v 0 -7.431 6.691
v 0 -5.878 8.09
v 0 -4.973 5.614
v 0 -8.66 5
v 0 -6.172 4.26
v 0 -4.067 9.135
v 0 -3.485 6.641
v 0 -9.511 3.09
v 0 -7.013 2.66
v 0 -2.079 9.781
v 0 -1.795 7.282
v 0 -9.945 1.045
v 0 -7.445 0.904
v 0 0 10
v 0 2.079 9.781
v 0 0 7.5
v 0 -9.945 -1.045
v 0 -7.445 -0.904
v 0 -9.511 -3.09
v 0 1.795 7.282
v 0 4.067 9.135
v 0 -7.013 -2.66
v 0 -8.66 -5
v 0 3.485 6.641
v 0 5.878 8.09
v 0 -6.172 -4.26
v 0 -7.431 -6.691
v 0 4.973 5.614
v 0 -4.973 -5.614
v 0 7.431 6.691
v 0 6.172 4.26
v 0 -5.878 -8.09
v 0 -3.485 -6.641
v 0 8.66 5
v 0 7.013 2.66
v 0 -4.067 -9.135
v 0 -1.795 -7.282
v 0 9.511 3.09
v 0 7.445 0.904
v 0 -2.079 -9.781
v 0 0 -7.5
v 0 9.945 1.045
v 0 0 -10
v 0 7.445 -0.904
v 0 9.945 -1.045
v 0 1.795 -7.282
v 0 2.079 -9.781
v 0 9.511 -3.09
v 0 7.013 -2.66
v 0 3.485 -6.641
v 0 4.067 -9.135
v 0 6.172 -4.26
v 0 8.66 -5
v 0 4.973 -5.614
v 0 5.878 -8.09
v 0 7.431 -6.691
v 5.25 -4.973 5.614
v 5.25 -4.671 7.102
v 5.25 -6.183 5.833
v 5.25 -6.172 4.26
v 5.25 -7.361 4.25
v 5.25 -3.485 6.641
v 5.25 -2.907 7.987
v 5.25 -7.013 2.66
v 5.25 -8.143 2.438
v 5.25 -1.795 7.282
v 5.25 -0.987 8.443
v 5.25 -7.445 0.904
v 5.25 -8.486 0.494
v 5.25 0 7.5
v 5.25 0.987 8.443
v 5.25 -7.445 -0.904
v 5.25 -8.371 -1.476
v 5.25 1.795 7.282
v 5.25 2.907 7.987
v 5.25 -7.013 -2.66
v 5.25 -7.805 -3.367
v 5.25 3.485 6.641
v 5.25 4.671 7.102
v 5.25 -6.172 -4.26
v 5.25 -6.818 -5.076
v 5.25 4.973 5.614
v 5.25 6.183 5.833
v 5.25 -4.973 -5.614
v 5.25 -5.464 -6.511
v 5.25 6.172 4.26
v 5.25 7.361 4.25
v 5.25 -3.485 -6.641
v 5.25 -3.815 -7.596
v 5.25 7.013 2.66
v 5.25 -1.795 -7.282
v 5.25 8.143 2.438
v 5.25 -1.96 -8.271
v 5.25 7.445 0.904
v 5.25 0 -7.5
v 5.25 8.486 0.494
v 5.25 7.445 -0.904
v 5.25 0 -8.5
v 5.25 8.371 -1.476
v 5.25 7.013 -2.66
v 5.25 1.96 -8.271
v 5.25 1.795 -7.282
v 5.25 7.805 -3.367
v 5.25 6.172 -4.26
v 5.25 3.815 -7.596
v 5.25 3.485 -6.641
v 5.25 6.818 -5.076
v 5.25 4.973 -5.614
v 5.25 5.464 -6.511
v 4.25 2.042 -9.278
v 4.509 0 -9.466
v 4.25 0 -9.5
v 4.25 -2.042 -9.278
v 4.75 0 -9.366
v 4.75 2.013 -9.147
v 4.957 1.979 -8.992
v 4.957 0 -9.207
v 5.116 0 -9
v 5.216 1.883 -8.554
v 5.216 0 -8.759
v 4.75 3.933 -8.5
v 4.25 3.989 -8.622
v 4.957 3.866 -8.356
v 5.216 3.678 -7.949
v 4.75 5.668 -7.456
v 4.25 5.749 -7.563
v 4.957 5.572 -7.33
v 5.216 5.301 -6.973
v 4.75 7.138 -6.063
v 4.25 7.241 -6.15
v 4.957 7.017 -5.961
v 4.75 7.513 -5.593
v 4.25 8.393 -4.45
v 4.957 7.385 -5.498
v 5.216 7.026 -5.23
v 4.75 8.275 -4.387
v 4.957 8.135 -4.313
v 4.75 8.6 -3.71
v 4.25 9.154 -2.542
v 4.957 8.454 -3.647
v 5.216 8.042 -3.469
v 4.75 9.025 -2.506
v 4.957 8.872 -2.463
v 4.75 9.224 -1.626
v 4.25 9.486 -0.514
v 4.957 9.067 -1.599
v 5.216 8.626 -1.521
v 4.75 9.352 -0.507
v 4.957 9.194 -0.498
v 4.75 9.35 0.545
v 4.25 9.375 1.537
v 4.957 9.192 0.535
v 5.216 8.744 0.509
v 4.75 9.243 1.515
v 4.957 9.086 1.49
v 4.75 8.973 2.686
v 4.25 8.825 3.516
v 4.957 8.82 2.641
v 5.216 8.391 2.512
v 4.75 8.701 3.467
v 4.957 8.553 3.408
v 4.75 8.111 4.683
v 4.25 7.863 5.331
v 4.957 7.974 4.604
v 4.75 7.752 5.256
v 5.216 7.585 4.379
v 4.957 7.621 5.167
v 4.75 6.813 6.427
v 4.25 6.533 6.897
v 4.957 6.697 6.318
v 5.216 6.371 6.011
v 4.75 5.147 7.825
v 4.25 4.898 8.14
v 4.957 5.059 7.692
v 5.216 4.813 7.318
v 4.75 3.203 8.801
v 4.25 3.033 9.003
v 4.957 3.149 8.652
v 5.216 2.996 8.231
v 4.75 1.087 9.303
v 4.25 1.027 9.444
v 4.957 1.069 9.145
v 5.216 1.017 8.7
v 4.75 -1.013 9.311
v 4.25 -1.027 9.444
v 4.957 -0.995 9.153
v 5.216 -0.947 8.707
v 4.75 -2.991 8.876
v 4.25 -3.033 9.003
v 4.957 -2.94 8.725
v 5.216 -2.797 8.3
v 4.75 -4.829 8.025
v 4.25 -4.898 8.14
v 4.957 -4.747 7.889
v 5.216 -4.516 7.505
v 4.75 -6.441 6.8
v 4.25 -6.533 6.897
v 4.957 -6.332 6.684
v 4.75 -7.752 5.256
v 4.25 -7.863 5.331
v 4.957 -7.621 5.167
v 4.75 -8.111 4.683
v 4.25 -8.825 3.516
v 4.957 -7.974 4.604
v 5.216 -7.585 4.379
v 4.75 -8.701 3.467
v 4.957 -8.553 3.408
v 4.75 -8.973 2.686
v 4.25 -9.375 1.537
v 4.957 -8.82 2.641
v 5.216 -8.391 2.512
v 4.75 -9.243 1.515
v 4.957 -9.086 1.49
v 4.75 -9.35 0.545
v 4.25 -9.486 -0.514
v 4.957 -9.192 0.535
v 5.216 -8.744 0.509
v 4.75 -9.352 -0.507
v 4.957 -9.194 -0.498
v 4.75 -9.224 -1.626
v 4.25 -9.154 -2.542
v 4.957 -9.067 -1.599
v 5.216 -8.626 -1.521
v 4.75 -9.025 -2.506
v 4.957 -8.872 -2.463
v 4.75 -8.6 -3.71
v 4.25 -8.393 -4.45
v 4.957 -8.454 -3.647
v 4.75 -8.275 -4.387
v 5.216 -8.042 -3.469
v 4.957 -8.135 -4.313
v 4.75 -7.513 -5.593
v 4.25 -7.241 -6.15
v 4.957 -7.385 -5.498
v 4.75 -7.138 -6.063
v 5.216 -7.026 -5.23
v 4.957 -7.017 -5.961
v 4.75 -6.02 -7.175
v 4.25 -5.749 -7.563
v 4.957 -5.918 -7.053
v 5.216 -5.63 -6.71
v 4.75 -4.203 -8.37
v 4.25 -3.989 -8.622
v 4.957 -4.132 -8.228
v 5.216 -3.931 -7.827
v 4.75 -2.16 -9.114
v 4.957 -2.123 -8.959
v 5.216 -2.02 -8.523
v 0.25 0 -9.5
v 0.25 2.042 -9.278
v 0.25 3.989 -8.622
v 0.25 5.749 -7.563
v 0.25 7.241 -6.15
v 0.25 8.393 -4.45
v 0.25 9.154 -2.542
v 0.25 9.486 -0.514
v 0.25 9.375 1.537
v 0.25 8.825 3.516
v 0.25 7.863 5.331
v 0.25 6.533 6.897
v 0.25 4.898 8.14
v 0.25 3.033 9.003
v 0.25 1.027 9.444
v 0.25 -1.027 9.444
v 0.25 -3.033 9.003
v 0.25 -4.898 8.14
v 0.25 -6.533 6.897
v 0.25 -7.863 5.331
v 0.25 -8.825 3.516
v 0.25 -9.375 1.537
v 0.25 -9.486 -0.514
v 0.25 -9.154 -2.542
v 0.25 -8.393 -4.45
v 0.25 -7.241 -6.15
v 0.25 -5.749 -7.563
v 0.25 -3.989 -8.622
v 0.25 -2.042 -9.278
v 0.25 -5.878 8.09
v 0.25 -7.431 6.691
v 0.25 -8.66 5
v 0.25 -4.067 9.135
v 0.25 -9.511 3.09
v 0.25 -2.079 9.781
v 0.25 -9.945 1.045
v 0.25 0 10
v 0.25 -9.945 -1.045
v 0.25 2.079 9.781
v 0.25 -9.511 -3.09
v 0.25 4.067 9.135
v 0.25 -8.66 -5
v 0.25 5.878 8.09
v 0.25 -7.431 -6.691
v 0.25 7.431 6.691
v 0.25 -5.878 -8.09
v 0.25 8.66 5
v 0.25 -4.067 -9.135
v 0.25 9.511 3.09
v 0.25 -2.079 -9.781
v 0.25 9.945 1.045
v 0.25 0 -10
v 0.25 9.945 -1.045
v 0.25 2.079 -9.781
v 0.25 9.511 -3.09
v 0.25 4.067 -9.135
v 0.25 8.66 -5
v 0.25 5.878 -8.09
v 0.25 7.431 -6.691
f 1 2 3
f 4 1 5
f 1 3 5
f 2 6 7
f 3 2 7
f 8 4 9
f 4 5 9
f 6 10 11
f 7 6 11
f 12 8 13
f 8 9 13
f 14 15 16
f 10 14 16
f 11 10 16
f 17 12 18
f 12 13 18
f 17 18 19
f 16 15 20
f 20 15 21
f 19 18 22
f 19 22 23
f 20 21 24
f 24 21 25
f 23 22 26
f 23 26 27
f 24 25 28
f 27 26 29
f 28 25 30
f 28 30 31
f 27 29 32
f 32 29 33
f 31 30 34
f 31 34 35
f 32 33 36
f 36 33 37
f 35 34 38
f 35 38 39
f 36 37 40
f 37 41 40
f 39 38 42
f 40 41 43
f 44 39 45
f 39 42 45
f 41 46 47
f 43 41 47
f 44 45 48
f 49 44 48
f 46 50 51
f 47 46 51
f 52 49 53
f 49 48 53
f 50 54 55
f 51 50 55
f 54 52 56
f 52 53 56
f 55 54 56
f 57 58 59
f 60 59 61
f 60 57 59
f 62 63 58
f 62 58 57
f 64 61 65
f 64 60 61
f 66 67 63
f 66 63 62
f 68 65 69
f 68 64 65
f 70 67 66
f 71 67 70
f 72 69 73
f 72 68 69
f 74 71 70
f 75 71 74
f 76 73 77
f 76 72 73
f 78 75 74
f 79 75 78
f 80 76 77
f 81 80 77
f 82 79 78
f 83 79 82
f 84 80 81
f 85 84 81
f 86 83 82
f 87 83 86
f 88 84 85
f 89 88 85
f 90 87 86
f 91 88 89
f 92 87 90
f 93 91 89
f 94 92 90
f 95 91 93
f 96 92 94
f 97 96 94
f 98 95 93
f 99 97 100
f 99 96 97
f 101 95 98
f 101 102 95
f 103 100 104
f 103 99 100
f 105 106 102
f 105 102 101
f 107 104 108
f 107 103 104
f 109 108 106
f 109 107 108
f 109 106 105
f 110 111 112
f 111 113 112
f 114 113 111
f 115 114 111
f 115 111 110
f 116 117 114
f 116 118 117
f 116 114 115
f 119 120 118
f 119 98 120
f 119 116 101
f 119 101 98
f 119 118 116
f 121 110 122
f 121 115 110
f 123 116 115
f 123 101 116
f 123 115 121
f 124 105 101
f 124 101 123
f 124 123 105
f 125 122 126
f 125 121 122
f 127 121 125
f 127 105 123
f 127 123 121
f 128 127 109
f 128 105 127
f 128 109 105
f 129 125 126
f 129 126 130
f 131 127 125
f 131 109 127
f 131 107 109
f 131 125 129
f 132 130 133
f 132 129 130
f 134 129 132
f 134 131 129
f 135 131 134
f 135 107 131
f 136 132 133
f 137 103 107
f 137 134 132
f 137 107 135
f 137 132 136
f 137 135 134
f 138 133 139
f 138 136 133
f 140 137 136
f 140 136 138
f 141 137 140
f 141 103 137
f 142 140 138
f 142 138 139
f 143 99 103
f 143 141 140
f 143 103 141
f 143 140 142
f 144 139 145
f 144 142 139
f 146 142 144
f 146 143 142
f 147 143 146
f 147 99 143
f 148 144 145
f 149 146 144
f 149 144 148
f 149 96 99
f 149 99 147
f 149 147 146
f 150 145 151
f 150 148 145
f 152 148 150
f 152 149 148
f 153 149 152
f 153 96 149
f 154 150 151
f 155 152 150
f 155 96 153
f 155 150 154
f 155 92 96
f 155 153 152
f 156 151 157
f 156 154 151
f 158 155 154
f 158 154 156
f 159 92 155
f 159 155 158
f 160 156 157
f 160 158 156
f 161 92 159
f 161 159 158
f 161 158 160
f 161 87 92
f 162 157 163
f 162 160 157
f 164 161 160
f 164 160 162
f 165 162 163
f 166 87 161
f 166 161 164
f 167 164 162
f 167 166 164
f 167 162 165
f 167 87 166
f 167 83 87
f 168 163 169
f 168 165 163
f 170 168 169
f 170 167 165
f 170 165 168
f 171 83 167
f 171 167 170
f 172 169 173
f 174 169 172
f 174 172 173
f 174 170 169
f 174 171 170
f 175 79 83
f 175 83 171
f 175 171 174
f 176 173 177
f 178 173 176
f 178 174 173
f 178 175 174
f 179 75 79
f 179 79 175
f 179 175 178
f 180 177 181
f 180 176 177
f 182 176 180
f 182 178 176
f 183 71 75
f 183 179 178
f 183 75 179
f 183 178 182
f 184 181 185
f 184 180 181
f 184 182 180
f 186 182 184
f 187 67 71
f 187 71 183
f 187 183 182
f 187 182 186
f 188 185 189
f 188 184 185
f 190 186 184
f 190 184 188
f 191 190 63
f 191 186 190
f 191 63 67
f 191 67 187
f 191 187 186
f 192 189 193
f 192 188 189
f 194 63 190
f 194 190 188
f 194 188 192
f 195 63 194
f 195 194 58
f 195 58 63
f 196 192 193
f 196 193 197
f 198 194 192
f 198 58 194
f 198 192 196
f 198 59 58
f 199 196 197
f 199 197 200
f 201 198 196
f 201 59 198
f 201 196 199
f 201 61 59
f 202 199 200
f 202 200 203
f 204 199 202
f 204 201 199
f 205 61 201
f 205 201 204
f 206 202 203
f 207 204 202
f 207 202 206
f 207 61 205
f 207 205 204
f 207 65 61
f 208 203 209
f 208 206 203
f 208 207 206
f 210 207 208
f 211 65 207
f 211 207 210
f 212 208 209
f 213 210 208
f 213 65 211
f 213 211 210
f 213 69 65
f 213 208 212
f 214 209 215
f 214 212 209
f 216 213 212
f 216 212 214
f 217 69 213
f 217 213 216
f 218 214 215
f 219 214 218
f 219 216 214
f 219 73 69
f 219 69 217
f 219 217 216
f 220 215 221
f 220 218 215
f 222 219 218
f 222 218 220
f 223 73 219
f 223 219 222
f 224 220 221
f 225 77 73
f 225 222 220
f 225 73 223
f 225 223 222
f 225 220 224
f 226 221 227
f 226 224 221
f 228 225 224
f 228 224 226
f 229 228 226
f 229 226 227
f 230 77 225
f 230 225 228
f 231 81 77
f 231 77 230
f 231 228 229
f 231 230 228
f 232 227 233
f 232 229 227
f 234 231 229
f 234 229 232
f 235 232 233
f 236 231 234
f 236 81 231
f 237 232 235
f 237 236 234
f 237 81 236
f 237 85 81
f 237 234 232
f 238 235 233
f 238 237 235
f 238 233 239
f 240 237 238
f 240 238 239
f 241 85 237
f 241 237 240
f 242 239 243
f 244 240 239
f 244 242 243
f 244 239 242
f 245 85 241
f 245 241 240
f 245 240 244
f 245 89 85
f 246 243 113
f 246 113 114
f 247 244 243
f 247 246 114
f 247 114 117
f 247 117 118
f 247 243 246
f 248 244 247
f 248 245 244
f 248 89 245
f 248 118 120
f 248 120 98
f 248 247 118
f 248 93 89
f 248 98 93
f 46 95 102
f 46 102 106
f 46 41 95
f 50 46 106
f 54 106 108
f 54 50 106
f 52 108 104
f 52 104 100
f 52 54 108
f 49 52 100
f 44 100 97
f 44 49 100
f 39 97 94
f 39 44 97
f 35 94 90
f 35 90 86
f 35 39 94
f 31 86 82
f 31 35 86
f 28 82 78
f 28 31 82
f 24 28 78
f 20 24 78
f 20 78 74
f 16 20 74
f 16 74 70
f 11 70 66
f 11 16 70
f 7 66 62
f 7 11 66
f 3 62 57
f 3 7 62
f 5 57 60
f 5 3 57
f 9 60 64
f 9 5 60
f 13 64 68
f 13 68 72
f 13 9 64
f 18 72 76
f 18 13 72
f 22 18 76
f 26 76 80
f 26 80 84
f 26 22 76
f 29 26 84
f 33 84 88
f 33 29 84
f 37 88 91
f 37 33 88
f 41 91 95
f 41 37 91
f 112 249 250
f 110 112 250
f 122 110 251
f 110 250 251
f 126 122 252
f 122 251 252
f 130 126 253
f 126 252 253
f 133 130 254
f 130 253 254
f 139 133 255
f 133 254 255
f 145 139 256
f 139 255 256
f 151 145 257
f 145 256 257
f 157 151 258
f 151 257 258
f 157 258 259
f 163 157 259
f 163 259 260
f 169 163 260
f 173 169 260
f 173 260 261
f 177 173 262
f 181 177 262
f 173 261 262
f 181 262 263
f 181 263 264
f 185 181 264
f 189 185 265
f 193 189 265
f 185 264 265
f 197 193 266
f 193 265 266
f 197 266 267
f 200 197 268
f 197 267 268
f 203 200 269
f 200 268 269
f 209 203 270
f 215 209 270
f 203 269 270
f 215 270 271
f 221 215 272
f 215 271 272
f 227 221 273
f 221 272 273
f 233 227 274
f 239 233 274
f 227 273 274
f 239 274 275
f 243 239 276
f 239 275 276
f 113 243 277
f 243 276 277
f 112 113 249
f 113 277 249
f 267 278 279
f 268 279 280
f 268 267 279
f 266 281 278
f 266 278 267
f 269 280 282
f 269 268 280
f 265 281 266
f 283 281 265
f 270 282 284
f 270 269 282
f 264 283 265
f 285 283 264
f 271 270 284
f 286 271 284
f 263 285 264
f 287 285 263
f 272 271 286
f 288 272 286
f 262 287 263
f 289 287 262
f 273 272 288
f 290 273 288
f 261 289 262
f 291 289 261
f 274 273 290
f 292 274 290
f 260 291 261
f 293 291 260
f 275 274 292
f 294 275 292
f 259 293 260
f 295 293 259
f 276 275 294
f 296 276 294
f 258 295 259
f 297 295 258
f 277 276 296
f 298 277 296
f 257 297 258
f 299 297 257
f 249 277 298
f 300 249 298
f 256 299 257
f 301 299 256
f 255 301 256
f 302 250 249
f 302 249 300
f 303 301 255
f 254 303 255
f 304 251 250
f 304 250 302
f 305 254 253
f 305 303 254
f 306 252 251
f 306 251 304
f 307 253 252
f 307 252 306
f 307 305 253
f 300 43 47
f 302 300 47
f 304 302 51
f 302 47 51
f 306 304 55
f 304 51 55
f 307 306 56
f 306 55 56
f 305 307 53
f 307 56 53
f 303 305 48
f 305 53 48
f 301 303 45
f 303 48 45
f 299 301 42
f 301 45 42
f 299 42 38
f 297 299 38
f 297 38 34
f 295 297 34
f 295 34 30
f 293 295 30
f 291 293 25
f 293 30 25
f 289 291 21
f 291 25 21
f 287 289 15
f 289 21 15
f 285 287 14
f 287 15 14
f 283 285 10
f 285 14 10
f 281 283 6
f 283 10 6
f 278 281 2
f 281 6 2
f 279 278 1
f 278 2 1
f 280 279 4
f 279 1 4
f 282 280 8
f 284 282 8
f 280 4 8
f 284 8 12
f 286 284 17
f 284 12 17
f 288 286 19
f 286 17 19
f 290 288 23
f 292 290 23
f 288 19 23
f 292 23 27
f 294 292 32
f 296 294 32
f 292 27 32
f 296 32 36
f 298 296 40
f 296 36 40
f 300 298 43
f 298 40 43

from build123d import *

# Parameters (mm, degrees)
SKETCH1_R           = 10
SKETCH1_R_2         = 7.5
BOSS_EXTRUDE1_DEPTH = 0.25
SKETCH2_R           = 9.5
SKETCH2_R_2         = 7.5
BOSS_EXTRUDE2_DEPTH = 5
FILLET1_R           = 1


with BuildPart() as part:
    # Sketch1 → Boss-Extrude1 (new body)
    with BuildSketch(Plane(origin=(0, 0, 0), x_dir=(0, 0, -1), z_dir=(1, 0, 0))):
        Circle(SKETCH1_R)
        Circle(SKETCH1_R_2, mode=Mode.SUBTRACT)
    extrude(amount=BOSS_EXTRUDE1_DEPTH)

    # Sketch2 → Boss-Extrude2 (add)
    with BuildSketch(Plane(origin=(0.25, 0, 0), x_dir=(0, 0, -1), z_dir=(1, 0, 0))):
        Circle(SKETCH2_R)
        Circle(SKETCH2_R_2, mode=Mode.SUBTRACT)
    extrude(amount=BOSS_EXTRUDE2_DEPTH)

    # Fillet1
    fillet1_edges = [part.edges().sort_by_distance(p)[0] for p in [
        (5.25, 0, 9.5),
    ]]
    fillet(fillet1_edges, radius=FILLET1_R)


solid = part.part
